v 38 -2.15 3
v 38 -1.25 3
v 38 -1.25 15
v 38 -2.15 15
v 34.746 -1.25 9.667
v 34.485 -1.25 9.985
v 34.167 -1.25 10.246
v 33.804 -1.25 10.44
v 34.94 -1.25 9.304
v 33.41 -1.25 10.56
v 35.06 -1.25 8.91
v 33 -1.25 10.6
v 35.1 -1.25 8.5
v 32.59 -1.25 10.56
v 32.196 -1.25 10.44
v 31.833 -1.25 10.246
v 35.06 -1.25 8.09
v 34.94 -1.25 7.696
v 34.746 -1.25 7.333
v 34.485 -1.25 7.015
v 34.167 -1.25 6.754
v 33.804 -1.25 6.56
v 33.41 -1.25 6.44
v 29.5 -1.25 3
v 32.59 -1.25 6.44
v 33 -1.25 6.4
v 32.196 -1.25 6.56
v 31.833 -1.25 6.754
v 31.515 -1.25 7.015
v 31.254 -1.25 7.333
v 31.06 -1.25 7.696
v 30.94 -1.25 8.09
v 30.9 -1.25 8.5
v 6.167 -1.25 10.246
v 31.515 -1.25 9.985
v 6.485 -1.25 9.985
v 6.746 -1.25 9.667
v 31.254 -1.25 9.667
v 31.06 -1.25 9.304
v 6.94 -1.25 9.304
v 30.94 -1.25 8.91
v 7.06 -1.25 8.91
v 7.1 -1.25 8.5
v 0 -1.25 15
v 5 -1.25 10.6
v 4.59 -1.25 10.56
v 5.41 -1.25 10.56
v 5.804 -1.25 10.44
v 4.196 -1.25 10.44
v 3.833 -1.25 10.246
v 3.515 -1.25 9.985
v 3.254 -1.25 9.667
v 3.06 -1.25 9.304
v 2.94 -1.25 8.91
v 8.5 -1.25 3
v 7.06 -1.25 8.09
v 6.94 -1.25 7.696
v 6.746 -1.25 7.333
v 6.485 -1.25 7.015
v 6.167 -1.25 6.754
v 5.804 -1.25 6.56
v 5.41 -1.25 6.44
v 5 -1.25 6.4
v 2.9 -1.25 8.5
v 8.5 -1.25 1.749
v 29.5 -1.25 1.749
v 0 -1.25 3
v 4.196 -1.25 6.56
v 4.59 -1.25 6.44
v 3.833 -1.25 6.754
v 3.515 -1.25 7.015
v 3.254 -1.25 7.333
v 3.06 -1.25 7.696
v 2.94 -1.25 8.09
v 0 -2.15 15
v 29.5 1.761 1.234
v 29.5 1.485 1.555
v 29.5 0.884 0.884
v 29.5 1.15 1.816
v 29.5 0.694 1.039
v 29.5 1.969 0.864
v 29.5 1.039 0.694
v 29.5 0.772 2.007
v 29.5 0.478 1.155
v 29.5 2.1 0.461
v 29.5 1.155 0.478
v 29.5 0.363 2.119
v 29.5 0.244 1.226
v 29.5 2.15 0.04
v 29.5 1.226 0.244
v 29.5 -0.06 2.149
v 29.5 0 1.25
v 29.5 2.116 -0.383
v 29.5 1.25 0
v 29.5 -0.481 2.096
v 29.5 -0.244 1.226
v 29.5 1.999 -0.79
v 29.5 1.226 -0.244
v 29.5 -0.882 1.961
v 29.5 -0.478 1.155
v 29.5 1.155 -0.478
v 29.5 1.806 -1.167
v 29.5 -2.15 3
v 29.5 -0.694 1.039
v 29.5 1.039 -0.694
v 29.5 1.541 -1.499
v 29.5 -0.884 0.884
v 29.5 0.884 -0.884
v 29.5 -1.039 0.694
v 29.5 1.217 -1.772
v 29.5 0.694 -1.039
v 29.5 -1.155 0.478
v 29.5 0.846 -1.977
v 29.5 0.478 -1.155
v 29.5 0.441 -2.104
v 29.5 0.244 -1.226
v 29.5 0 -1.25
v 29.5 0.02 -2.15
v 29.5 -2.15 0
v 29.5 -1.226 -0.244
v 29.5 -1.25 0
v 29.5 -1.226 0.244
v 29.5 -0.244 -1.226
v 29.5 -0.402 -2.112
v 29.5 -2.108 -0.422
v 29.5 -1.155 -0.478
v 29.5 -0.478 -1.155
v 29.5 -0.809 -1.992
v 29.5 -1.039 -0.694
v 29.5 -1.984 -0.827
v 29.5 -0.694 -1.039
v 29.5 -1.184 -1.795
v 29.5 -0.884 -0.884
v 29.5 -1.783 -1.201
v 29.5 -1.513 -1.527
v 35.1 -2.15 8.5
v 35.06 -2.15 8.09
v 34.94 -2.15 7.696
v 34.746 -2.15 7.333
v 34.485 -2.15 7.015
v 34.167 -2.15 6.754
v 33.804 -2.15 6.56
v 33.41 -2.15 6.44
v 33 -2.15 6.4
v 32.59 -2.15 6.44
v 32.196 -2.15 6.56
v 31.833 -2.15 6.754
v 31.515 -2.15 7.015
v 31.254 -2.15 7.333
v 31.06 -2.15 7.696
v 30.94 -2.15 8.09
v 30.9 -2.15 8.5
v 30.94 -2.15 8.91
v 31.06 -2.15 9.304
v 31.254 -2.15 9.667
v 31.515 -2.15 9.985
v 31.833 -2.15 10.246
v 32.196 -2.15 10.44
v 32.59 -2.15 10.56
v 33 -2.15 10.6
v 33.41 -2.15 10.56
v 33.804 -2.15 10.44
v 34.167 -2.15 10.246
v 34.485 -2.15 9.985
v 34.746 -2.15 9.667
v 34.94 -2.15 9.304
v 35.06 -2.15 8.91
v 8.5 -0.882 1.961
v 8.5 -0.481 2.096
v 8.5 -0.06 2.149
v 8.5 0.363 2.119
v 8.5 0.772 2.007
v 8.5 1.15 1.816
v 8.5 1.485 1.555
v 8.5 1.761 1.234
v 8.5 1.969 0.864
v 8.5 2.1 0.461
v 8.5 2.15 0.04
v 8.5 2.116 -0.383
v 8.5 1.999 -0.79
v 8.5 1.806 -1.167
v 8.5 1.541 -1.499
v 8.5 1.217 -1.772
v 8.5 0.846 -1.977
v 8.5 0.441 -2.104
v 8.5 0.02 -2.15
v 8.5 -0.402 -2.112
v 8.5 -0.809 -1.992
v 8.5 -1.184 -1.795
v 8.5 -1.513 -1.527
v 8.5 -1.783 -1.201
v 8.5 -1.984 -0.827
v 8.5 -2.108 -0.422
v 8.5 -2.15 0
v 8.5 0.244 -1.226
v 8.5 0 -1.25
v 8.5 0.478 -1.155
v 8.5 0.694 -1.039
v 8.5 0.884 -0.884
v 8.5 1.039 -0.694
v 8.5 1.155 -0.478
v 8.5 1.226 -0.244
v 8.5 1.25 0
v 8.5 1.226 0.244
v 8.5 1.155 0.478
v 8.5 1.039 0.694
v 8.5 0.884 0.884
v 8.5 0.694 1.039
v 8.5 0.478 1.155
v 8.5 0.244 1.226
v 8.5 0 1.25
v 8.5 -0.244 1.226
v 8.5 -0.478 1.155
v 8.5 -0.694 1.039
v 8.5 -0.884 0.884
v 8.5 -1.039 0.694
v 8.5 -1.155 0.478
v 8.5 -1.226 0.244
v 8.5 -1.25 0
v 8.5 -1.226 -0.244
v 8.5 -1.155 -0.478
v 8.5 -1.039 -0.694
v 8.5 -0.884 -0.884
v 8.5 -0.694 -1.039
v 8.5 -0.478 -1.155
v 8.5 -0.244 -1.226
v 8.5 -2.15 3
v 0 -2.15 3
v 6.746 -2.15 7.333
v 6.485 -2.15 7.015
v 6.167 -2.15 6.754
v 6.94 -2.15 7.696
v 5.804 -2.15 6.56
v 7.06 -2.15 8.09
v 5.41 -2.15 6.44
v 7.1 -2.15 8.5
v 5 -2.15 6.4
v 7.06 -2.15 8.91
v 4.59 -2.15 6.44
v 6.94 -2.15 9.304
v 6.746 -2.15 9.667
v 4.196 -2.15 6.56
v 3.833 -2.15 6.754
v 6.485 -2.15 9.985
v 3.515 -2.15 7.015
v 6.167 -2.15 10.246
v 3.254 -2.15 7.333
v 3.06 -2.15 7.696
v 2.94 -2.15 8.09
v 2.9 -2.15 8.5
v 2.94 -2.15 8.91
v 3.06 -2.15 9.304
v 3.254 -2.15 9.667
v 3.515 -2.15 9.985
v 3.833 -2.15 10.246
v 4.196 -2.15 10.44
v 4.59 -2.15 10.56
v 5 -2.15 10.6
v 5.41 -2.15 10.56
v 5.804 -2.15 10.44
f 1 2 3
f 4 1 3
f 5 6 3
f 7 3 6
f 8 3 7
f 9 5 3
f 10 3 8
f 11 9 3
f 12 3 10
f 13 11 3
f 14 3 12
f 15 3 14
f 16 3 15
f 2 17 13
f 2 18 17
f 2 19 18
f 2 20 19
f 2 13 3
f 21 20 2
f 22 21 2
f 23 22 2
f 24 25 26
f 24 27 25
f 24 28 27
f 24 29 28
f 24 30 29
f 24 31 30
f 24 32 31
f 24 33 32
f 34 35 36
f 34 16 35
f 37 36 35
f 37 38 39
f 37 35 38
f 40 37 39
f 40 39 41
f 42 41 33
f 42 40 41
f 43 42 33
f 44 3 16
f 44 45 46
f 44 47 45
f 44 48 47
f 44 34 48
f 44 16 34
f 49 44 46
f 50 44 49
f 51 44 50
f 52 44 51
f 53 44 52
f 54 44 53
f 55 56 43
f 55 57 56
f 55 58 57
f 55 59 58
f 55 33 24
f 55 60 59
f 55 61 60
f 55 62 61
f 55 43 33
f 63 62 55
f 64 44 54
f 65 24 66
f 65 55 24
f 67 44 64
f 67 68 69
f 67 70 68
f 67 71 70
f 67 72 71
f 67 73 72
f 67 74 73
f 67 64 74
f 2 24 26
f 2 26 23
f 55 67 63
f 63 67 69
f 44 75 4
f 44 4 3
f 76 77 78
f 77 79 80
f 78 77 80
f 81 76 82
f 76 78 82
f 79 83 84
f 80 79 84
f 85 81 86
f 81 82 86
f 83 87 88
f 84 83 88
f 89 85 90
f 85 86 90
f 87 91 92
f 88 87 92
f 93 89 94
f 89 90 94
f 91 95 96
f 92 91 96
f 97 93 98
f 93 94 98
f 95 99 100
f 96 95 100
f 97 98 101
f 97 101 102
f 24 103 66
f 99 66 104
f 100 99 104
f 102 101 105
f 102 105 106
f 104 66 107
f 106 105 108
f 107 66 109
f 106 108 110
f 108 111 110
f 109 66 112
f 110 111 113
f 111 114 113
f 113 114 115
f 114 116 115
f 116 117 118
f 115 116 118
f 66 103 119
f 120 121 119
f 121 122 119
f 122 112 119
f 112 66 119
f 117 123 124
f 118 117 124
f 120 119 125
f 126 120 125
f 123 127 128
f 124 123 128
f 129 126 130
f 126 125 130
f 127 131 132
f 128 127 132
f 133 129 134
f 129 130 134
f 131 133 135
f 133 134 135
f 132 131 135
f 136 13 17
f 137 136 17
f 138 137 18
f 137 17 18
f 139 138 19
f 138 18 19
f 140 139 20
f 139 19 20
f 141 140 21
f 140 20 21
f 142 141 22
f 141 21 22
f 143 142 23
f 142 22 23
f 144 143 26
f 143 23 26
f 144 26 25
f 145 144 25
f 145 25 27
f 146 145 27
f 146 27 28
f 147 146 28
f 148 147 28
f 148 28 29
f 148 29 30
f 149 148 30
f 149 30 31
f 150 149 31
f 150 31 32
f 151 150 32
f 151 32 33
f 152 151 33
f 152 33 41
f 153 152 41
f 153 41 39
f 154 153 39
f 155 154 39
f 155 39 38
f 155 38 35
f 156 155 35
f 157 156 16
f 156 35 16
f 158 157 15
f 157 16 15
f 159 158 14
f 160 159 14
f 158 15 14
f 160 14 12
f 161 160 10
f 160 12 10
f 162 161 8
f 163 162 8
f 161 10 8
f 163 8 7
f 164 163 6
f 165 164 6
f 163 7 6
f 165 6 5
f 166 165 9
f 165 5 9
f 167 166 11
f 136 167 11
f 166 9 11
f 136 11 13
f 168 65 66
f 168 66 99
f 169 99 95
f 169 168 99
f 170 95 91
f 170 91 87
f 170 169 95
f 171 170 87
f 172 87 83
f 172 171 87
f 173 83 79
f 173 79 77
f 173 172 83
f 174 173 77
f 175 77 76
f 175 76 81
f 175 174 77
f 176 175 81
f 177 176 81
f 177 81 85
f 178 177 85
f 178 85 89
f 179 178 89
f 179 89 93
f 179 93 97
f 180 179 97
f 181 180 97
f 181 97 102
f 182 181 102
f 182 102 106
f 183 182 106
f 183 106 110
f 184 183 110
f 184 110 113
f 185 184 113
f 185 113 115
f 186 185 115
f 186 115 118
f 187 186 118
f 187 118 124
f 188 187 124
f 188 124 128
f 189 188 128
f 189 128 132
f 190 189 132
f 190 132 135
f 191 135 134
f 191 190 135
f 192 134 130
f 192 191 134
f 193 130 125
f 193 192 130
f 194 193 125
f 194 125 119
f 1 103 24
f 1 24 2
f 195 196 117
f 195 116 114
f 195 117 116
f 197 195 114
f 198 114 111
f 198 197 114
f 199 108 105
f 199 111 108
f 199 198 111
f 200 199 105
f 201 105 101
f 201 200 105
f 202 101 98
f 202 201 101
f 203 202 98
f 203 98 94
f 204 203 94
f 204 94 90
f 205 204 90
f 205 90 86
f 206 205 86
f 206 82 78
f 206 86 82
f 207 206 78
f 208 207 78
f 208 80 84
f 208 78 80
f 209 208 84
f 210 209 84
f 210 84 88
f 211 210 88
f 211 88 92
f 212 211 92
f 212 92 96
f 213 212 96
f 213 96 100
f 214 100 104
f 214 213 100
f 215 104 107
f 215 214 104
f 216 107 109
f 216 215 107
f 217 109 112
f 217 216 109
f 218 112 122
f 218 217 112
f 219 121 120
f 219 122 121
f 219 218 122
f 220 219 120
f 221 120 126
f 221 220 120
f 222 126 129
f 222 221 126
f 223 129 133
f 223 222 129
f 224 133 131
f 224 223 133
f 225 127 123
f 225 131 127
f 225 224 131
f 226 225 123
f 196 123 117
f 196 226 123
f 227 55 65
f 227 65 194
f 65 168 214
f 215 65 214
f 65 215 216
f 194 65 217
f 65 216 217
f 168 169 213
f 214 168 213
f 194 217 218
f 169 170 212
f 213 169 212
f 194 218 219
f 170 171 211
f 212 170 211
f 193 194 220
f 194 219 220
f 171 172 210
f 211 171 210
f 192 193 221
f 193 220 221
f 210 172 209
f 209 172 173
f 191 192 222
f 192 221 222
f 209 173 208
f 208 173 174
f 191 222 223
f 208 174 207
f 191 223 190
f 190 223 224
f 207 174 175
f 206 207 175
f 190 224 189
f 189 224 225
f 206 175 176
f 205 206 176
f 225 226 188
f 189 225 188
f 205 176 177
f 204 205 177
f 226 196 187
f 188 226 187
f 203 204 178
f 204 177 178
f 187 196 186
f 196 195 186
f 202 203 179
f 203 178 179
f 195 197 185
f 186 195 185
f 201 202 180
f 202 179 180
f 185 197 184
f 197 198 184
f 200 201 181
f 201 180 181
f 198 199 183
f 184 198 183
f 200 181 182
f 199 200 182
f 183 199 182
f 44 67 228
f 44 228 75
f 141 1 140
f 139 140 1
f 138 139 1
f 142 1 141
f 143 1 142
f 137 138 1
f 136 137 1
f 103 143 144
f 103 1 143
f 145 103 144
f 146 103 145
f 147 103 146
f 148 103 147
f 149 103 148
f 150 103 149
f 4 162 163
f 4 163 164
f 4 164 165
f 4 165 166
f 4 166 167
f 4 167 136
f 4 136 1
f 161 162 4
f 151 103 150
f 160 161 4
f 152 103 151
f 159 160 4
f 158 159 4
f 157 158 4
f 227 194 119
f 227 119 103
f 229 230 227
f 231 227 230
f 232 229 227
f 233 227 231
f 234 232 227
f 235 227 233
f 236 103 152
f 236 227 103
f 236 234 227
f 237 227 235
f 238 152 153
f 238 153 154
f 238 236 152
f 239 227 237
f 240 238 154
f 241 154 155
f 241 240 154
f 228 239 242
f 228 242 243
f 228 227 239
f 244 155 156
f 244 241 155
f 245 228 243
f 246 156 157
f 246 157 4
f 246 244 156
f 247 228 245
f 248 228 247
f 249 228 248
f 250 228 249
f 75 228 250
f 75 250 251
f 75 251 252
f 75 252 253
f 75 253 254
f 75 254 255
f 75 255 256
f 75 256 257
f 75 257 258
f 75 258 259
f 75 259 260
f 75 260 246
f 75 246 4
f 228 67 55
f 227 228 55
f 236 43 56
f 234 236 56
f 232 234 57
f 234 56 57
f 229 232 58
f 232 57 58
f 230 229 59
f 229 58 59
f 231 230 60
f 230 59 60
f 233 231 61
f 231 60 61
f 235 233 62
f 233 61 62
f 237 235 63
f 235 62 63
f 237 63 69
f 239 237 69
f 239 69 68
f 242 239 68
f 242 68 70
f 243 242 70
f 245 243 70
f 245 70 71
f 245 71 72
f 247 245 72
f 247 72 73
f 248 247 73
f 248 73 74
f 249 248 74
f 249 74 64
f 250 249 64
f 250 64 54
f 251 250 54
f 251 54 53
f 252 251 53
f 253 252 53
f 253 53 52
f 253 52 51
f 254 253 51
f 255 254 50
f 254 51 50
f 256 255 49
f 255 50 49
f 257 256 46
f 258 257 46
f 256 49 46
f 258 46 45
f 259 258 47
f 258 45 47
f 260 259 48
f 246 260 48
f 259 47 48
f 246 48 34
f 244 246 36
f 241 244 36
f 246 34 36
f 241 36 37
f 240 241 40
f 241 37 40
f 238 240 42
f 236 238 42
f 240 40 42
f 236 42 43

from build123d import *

# Parameters (mm, degrees)
SKETCH_1_R          = 1.25
EXTRUDE_1_DEPTH     = 38
SKETCH_2_R          = 2.1
SKETCH_2_W          = 8.5
SKETCH_2_H          = 8.890130192
CUT_EXTRUDE_1_DEPTH = 19


with BuildPart() as part:
    # 草图1 → 凸台-拉伸1 (new body)
    with BuildSketch(Plane(origin=(0, 0, 0), x_dir=(0, 0, -1), z_dir=(1, 0, 0))):
        with BuildLine():
            Line((0, -2.15), (-15, -2.15))
            Line((-15, -2.15), (-15, -1.25))
            Line((-15, -1.25), (-1.749285568, -1.25))
            ThreePointArc((-1.749285568, -1.25), (0.983615779, 1.911805429), (0, -2.15))
        make_face()
        Circle(SKETCH_1_R, mode=Mode.SUBTRACT)
    extrude(amount=EXTRUDE_1_DEPTH)

    # 草图2 → 切除-拉伸1 (cut, symmetric)
    with BuildSketch(Plane(origin=(0, 0, 0), x_dir=(1, 0, 0), z_dir=(0, 1, 0))):
        with Locations((33, -8.5)):
            Circle(SKETCH_2_R)
        with Locations((5, -8.5)):
            Circle(SKETCH_2_R)
        with Locations((33.75, 1.445065096)):
            Rectangle(SKETCH_2_W, SKETCH_2_H)
        with Locations((4.25, 1.445065096)):
            Rectangle(SKETCH_2_W, SKETCH_2_H)
    extrude(amount=CUT_EXTRUDE_1_DEPTH, both=True, mode=Mode.SUBTRACT)


solid = part.part
